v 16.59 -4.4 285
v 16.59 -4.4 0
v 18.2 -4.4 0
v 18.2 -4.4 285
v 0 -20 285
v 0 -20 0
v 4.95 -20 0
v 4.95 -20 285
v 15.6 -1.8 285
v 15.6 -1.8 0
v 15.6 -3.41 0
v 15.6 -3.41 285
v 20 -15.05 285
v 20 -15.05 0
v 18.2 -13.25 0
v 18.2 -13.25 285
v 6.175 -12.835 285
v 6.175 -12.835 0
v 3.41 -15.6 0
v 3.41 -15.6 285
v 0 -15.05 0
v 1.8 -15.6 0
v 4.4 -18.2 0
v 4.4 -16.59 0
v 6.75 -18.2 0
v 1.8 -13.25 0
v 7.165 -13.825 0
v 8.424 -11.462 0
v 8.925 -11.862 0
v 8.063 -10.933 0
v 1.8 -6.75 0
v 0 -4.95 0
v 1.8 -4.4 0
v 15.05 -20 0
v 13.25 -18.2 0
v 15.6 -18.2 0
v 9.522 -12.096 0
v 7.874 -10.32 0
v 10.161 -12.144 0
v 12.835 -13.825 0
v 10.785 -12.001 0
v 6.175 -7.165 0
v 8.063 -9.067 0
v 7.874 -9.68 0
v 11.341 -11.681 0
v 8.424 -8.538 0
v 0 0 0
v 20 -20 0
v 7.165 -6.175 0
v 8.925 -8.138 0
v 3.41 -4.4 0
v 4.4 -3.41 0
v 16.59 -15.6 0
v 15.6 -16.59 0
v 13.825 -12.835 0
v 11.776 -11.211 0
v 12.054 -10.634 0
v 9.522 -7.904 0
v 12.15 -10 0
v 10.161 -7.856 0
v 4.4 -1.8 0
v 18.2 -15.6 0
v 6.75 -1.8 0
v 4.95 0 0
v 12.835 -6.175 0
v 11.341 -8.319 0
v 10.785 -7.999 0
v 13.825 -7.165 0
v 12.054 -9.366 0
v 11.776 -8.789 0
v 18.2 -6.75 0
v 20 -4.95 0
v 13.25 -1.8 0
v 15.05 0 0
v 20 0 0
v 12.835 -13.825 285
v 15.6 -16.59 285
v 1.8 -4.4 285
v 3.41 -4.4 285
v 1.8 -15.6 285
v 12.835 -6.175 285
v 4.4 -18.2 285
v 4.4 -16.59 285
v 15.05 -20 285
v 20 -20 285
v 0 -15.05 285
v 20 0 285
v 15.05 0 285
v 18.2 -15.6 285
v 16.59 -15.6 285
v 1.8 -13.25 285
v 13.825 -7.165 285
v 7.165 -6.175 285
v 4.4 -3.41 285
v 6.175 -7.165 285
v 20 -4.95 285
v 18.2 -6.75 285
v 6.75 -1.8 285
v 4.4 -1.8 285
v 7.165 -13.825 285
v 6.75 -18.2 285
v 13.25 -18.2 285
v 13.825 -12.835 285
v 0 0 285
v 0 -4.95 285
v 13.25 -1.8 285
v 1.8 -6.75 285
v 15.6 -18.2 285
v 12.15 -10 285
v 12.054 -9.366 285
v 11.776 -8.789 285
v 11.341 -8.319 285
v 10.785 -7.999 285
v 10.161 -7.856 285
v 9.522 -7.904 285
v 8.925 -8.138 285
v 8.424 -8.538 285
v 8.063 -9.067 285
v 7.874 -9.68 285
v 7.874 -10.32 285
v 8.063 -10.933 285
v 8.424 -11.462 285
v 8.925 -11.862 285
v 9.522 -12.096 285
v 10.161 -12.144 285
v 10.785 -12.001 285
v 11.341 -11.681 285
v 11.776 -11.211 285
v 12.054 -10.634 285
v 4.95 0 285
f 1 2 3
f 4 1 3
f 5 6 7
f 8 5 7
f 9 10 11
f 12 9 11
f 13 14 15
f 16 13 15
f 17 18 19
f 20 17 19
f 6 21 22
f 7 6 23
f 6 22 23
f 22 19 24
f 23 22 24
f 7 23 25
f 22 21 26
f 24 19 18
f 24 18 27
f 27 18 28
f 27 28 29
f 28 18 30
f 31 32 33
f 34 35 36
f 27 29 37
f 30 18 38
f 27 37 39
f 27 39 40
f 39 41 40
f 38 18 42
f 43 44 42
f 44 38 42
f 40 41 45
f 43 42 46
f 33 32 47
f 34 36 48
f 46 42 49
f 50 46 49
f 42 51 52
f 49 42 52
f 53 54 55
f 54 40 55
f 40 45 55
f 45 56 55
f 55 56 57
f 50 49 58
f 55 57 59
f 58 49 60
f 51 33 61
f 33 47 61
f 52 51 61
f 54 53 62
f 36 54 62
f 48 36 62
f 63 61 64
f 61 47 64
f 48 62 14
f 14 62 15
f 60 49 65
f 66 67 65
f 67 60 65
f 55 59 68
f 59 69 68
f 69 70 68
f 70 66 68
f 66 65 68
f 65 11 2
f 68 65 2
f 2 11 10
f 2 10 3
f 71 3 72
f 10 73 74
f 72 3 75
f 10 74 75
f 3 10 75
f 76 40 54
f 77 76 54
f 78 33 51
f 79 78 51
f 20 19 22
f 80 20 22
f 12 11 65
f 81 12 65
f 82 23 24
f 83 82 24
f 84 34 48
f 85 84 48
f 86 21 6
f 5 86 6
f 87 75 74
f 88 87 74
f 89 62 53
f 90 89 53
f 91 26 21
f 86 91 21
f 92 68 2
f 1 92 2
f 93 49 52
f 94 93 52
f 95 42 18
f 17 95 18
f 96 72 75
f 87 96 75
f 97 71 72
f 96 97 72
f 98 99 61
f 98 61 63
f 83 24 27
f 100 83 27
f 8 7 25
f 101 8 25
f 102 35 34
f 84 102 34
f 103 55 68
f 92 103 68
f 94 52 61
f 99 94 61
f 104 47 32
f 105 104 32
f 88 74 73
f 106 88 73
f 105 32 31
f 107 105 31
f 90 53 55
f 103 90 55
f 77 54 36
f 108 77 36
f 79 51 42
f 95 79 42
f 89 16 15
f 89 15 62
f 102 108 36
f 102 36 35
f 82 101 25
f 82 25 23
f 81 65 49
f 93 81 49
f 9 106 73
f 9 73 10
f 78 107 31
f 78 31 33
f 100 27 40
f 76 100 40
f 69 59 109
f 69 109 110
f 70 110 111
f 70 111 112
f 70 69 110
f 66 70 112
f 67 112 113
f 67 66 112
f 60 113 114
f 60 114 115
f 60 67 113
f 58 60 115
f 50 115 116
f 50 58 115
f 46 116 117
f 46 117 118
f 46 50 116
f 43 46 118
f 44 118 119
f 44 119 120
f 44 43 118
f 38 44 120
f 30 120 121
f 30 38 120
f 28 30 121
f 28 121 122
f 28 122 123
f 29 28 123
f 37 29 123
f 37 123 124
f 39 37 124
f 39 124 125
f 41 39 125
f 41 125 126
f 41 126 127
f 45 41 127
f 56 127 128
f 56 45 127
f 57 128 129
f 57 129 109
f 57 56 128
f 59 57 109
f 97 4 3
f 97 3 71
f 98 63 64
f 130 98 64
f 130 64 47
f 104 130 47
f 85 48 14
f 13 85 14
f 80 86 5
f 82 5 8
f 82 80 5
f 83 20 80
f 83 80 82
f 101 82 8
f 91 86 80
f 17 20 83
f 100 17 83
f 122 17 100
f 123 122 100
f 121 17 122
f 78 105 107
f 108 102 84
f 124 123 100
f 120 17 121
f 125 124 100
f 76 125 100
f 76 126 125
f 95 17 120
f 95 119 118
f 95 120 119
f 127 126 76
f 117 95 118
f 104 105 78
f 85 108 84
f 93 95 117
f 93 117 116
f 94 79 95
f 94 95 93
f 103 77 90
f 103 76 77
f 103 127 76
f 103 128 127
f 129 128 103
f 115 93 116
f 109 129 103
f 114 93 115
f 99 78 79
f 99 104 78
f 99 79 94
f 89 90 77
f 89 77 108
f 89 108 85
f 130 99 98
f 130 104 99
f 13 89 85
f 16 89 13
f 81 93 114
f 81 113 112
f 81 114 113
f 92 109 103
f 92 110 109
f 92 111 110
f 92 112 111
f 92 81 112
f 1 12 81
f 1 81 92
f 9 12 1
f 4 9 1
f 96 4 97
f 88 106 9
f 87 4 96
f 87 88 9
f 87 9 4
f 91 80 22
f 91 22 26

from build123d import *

# Parameters (mm, degrees)
CROQUIS1_R      = 2.15
BOSCHBASE_DEPTH = 285


with BuildPart() as part:
    # Croquis1 → BoschBase (new body)
    with BuildSketch(Plane.XY):
        Polygon((4.4, 0), (0, 0), (0, -0.56736664), (0, -4.4), (0, -4.95), (1.8, -6.75), (1.8, -4.4), (3.410050506, -4.4), (6.175, -7.164949494), (6.175, -12.835050506), (3.410050506, -15.6), (1.8, -15.6), (1.8, -13.25), (0, -15.05), (0, -15.6), (0, -20), (4.4, -20), (4.95, -20), (6.75, -18.2), (4.4, -18.2), (4.4, -16.589949494), (7.164949494, -13.825), (12.835050506, -13.825), (15.6, -16.589949494), (15.6, -18.2), (13.25, -18.2), (15.05, -20), (15.6, -20), (18.2, -20), (20, -20), (20, -15.6), (20, -15.05), (18.2, -13.25), (18.2, -15.6), (16.589949494, -15.6), (13.825, -12.835050506), (13.825, -7.164949494), (16.589949494, -4.4), (18.2, -4.4), (18.2, -6.75), (20, -4.95), (20, -4.4), (20, 0), (15.6, 0), (15.05, 0), (13.25, -1.8), (15.6, -1.8), (15.6, -3.410050506), (12.835050506, -6.175), (7.164949494, -6.175), (4.4, -3.410050506), (4.4, -1.8), (6.75, -1.8), (4.95, 0), align=None)
        with Locations((10, -10)):
            Circle(CROQUIS1_R, mode=Mode.SUBTRACT)
    extrude(amount=BOSCHBASE_DEPTH)


solid = part.part
